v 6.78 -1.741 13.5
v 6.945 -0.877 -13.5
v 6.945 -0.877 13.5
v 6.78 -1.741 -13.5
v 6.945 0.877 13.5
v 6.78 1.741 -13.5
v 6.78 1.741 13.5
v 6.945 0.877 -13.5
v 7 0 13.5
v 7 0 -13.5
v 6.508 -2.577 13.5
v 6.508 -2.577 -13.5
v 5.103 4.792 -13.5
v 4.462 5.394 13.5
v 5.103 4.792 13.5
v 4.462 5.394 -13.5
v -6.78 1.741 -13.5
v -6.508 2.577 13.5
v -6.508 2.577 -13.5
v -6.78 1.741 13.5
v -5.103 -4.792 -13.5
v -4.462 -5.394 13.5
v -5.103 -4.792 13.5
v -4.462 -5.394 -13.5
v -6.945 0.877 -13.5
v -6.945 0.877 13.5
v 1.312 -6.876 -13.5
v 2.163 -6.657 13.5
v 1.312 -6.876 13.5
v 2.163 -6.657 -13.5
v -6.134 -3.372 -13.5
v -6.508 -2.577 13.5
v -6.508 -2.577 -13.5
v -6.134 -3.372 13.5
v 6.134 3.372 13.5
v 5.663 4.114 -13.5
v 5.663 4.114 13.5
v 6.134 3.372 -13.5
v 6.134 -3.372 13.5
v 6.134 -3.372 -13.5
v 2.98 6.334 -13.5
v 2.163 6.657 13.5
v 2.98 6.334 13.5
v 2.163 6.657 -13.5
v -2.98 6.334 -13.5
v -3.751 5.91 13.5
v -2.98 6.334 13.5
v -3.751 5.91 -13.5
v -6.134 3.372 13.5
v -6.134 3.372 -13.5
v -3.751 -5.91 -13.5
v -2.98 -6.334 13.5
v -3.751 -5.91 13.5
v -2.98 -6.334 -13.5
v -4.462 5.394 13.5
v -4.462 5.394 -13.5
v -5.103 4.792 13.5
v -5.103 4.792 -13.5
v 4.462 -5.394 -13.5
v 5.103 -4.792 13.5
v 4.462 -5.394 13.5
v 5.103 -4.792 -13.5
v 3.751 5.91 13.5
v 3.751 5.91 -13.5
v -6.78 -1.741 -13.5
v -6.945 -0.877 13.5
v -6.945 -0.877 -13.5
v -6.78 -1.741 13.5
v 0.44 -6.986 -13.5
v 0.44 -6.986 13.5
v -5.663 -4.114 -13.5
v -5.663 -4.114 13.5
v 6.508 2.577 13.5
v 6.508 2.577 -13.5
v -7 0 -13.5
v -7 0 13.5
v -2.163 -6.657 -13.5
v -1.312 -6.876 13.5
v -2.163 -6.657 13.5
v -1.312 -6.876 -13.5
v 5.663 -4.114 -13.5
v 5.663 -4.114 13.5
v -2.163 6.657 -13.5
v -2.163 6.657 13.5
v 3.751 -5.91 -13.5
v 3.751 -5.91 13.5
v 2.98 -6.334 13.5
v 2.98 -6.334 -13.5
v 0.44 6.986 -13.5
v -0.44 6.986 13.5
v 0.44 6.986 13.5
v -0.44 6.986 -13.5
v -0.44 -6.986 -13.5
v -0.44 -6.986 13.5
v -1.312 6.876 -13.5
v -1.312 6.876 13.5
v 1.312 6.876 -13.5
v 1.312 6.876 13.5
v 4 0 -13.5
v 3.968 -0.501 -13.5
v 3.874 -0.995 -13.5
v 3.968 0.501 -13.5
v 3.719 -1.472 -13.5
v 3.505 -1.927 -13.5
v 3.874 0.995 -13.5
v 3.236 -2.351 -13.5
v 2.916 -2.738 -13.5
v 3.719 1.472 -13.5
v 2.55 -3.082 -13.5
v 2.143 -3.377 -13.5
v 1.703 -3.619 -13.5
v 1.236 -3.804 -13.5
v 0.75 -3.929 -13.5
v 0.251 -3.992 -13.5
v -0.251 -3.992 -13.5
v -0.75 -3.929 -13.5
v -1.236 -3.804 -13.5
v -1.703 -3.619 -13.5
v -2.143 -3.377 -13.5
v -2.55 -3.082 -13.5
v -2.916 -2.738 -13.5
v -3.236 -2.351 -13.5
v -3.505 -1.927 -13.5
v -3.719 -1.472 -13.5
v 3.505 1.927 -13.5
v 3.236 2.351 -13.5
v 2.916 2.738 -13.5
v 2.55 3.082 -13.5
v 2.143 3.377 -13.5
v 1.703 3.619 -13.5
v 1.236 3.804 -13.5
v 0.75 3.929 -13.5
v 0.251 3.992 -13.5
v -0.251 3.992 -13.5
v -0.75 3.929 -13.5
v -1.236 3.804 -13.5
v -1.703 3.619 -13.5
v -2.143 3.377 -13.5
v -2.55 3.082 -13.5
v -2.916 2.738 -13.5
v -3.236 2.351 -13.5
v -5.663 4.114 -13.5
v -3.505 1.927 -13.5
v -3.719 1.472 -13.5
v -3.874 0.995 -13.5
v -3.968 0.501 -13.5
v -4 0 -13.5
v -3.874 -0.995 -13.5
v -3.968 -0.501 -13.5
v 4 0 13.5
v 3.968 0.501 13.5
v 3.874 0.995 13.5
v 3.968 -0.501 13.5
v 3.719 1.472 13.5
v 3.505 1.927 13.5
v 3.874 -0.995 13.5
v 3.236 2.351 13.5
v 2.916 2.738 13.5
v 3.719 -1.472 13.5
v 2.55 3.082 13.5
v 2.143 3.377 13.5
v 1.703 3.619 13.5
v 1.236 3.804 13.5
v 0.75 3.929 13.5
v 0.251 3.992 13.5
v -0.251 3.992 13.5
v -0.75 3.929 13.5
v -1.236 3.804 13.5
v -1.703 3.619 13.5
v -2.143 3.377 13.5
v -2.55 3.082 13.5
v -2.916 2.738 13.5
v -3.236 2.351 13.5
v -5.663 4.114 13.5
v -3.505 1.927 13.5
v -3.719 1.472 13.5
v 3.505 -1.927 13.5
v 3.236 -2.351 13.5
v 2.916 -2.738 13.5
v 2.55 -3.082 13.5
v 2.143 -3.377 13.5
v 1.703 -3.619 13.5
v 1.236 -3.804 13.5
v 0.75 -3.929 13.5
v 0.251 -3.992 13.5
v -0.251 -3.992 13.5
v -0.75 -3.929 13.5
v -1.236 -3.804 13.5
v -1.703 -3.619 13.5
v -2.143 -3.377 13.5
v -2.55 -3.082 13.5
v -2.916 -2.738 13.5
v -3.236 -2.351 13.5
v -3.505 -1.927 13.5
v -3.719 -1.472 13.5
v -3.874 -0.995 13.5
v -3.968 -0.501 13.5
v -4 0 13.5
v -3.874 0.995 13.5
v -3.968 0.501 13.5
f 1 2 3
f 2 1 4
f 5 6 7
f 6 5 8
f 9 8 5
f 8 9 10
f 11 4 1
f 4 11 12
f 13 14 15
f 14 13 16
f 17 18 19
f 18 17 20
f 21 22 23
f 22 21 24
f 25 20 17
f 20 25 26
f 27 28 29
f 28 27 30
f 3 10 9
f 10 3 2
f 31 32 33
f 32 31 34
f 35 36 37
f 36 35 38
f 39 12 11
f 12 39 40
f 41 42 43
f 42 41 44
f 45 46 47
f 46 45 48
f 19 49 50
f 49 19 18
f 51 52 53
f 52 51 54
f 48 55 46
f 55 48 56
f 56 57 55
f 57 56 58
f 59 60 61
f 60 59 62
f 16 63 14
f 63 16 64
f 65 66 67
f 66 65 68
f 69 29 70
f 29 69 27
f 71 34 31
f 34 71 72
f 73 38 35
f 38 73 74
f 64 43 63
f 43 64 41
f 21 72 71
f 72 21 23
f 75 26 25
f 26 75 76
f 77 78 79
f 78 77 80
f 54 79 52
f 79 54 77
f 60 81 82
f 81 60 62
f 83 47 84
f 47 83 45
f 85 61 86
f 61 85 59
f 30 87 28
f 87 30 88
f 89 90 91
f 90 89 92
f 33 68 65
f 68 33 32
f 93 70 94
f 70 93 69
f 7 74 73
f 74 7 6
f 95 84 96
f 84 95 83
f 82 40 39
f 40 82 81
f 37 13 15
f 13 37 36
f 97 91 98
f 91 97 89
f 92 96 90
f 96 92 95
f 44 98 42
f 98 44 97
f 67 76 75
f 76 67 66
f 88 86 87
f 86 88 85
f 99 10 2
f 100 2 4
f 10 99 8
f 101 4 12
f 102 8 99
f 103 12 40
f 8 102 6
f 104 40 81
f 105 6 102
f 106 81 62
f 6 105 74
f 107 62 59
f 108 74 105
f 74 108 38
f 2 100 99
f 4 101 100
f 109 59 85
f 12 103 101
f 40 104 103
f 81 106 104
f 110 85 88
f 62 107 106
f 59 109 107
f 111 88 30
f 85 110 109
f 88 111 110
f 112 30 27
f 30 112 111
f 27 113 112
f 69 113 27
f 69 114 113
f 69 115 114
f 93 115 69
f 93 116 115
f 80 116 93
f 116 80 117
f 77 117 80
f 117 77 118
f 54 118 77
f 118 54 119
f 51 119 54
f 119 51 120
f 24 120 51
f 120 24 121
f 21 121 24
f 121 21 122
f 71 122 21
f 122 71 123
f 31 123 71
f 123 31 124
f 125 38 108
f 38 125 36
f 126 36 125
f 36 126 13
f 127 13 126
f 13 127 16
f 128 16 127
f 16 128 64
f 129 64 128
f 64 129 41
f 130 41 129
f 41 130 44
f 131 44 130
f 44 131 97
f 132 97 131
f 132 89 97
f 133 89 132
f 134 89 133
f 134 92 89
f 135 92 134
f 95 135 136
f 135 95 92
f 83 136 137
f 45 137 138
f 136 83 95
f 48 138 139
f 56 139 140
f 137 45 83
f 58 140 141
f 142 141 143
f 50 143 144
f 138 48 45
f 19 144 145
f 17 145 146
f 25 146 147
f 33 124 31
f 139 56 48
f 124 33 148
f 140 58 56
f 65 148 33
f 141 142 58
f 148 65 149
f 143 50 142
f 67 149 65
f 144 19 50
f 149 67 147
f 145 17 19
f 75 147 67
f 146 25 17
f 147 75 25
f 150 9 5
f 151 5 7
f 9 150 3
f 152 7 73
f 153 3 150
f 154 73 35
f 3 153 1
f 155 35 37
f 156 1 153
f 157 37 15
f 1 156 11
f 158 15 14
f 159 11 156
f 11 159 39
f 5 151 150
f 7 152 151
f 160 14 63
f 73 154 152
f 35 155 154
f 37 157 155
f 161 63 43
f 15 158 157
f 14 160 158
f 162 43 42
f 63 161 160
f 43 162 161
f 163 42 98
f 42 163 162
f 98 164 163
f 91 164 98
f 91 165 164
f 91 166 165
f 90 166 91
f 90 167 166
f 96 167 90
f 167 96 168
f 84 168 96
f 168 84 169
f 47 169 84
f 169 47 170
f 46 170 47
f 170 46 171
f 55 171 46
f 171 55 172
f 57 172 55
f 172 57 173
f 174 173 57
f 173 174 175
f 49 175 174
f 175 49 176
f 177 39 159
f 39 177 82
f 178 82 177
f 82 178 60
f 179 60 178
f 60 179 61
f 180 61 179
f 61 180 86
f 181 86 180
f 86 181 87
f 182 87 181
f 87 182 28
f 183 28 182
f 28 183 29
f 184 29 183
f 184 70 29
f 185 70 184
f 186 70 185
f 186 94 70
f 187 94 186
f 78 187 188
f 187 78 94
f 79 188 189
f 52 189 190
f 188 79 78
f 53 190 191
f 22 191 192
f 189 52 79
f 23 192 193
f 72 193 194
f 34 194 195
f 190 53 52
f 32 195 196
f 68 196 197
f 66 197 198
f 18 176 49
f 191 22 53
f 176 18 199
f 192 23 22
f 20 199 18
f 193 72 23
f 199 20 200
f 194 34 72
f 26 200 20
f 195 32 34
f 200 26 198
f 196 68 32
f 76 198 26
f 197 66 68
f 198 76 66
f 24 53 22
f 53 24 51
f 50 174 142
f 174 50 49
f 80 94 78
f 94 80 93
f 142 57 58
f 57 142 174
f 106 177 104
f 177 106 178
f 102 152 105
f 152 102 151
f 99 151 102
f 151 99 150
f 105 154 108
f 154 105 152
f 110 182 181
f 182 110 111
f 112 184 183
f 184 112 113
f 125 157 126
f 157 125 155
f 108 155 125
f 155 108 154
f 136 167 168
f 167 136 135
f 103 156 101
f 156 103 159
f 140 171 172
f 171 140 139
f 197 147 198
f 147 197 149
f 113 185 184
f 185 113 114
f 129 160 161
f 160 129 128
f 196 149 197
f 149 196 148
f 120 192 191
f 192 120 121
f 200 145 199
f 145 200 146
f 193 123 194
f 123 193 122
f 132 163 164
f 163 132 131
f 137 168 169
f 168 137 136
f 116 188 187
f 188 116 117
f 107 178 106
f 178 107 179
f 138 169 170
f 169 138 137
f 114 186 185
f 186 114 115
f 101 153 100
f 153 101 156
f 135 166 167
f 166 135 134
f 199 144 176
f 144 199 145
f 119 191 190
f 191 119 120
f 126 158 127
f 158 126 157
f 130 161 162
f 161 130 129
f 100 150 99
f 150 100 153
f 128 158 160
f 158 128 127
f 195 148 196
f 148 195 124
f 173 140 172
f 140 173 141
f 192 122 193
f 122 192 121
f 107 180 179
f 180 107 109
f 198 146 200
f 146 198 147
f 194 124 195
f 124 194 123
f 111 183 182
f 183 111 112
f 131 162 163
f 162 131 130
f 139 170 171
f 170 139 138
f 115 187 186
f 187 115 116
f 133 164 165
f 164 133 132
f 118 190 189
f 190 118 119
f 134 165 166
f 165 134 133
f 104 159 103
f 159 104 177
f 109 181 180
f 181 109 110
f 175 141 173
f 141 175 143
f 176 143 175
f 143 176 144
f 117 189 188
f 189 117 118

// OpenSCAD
$fn = 50;


difference() {
	union() {
		translate(v = [0, 0, -13.5000000000]) {
			cylinder(h = 27, r = 7.0000000000);
		}
	}
	union() {
		translate(v = [0, 0, -100.0000000000]) {
			cylinder(h = 200, r = 4.0000000000);
		}
	}
}
